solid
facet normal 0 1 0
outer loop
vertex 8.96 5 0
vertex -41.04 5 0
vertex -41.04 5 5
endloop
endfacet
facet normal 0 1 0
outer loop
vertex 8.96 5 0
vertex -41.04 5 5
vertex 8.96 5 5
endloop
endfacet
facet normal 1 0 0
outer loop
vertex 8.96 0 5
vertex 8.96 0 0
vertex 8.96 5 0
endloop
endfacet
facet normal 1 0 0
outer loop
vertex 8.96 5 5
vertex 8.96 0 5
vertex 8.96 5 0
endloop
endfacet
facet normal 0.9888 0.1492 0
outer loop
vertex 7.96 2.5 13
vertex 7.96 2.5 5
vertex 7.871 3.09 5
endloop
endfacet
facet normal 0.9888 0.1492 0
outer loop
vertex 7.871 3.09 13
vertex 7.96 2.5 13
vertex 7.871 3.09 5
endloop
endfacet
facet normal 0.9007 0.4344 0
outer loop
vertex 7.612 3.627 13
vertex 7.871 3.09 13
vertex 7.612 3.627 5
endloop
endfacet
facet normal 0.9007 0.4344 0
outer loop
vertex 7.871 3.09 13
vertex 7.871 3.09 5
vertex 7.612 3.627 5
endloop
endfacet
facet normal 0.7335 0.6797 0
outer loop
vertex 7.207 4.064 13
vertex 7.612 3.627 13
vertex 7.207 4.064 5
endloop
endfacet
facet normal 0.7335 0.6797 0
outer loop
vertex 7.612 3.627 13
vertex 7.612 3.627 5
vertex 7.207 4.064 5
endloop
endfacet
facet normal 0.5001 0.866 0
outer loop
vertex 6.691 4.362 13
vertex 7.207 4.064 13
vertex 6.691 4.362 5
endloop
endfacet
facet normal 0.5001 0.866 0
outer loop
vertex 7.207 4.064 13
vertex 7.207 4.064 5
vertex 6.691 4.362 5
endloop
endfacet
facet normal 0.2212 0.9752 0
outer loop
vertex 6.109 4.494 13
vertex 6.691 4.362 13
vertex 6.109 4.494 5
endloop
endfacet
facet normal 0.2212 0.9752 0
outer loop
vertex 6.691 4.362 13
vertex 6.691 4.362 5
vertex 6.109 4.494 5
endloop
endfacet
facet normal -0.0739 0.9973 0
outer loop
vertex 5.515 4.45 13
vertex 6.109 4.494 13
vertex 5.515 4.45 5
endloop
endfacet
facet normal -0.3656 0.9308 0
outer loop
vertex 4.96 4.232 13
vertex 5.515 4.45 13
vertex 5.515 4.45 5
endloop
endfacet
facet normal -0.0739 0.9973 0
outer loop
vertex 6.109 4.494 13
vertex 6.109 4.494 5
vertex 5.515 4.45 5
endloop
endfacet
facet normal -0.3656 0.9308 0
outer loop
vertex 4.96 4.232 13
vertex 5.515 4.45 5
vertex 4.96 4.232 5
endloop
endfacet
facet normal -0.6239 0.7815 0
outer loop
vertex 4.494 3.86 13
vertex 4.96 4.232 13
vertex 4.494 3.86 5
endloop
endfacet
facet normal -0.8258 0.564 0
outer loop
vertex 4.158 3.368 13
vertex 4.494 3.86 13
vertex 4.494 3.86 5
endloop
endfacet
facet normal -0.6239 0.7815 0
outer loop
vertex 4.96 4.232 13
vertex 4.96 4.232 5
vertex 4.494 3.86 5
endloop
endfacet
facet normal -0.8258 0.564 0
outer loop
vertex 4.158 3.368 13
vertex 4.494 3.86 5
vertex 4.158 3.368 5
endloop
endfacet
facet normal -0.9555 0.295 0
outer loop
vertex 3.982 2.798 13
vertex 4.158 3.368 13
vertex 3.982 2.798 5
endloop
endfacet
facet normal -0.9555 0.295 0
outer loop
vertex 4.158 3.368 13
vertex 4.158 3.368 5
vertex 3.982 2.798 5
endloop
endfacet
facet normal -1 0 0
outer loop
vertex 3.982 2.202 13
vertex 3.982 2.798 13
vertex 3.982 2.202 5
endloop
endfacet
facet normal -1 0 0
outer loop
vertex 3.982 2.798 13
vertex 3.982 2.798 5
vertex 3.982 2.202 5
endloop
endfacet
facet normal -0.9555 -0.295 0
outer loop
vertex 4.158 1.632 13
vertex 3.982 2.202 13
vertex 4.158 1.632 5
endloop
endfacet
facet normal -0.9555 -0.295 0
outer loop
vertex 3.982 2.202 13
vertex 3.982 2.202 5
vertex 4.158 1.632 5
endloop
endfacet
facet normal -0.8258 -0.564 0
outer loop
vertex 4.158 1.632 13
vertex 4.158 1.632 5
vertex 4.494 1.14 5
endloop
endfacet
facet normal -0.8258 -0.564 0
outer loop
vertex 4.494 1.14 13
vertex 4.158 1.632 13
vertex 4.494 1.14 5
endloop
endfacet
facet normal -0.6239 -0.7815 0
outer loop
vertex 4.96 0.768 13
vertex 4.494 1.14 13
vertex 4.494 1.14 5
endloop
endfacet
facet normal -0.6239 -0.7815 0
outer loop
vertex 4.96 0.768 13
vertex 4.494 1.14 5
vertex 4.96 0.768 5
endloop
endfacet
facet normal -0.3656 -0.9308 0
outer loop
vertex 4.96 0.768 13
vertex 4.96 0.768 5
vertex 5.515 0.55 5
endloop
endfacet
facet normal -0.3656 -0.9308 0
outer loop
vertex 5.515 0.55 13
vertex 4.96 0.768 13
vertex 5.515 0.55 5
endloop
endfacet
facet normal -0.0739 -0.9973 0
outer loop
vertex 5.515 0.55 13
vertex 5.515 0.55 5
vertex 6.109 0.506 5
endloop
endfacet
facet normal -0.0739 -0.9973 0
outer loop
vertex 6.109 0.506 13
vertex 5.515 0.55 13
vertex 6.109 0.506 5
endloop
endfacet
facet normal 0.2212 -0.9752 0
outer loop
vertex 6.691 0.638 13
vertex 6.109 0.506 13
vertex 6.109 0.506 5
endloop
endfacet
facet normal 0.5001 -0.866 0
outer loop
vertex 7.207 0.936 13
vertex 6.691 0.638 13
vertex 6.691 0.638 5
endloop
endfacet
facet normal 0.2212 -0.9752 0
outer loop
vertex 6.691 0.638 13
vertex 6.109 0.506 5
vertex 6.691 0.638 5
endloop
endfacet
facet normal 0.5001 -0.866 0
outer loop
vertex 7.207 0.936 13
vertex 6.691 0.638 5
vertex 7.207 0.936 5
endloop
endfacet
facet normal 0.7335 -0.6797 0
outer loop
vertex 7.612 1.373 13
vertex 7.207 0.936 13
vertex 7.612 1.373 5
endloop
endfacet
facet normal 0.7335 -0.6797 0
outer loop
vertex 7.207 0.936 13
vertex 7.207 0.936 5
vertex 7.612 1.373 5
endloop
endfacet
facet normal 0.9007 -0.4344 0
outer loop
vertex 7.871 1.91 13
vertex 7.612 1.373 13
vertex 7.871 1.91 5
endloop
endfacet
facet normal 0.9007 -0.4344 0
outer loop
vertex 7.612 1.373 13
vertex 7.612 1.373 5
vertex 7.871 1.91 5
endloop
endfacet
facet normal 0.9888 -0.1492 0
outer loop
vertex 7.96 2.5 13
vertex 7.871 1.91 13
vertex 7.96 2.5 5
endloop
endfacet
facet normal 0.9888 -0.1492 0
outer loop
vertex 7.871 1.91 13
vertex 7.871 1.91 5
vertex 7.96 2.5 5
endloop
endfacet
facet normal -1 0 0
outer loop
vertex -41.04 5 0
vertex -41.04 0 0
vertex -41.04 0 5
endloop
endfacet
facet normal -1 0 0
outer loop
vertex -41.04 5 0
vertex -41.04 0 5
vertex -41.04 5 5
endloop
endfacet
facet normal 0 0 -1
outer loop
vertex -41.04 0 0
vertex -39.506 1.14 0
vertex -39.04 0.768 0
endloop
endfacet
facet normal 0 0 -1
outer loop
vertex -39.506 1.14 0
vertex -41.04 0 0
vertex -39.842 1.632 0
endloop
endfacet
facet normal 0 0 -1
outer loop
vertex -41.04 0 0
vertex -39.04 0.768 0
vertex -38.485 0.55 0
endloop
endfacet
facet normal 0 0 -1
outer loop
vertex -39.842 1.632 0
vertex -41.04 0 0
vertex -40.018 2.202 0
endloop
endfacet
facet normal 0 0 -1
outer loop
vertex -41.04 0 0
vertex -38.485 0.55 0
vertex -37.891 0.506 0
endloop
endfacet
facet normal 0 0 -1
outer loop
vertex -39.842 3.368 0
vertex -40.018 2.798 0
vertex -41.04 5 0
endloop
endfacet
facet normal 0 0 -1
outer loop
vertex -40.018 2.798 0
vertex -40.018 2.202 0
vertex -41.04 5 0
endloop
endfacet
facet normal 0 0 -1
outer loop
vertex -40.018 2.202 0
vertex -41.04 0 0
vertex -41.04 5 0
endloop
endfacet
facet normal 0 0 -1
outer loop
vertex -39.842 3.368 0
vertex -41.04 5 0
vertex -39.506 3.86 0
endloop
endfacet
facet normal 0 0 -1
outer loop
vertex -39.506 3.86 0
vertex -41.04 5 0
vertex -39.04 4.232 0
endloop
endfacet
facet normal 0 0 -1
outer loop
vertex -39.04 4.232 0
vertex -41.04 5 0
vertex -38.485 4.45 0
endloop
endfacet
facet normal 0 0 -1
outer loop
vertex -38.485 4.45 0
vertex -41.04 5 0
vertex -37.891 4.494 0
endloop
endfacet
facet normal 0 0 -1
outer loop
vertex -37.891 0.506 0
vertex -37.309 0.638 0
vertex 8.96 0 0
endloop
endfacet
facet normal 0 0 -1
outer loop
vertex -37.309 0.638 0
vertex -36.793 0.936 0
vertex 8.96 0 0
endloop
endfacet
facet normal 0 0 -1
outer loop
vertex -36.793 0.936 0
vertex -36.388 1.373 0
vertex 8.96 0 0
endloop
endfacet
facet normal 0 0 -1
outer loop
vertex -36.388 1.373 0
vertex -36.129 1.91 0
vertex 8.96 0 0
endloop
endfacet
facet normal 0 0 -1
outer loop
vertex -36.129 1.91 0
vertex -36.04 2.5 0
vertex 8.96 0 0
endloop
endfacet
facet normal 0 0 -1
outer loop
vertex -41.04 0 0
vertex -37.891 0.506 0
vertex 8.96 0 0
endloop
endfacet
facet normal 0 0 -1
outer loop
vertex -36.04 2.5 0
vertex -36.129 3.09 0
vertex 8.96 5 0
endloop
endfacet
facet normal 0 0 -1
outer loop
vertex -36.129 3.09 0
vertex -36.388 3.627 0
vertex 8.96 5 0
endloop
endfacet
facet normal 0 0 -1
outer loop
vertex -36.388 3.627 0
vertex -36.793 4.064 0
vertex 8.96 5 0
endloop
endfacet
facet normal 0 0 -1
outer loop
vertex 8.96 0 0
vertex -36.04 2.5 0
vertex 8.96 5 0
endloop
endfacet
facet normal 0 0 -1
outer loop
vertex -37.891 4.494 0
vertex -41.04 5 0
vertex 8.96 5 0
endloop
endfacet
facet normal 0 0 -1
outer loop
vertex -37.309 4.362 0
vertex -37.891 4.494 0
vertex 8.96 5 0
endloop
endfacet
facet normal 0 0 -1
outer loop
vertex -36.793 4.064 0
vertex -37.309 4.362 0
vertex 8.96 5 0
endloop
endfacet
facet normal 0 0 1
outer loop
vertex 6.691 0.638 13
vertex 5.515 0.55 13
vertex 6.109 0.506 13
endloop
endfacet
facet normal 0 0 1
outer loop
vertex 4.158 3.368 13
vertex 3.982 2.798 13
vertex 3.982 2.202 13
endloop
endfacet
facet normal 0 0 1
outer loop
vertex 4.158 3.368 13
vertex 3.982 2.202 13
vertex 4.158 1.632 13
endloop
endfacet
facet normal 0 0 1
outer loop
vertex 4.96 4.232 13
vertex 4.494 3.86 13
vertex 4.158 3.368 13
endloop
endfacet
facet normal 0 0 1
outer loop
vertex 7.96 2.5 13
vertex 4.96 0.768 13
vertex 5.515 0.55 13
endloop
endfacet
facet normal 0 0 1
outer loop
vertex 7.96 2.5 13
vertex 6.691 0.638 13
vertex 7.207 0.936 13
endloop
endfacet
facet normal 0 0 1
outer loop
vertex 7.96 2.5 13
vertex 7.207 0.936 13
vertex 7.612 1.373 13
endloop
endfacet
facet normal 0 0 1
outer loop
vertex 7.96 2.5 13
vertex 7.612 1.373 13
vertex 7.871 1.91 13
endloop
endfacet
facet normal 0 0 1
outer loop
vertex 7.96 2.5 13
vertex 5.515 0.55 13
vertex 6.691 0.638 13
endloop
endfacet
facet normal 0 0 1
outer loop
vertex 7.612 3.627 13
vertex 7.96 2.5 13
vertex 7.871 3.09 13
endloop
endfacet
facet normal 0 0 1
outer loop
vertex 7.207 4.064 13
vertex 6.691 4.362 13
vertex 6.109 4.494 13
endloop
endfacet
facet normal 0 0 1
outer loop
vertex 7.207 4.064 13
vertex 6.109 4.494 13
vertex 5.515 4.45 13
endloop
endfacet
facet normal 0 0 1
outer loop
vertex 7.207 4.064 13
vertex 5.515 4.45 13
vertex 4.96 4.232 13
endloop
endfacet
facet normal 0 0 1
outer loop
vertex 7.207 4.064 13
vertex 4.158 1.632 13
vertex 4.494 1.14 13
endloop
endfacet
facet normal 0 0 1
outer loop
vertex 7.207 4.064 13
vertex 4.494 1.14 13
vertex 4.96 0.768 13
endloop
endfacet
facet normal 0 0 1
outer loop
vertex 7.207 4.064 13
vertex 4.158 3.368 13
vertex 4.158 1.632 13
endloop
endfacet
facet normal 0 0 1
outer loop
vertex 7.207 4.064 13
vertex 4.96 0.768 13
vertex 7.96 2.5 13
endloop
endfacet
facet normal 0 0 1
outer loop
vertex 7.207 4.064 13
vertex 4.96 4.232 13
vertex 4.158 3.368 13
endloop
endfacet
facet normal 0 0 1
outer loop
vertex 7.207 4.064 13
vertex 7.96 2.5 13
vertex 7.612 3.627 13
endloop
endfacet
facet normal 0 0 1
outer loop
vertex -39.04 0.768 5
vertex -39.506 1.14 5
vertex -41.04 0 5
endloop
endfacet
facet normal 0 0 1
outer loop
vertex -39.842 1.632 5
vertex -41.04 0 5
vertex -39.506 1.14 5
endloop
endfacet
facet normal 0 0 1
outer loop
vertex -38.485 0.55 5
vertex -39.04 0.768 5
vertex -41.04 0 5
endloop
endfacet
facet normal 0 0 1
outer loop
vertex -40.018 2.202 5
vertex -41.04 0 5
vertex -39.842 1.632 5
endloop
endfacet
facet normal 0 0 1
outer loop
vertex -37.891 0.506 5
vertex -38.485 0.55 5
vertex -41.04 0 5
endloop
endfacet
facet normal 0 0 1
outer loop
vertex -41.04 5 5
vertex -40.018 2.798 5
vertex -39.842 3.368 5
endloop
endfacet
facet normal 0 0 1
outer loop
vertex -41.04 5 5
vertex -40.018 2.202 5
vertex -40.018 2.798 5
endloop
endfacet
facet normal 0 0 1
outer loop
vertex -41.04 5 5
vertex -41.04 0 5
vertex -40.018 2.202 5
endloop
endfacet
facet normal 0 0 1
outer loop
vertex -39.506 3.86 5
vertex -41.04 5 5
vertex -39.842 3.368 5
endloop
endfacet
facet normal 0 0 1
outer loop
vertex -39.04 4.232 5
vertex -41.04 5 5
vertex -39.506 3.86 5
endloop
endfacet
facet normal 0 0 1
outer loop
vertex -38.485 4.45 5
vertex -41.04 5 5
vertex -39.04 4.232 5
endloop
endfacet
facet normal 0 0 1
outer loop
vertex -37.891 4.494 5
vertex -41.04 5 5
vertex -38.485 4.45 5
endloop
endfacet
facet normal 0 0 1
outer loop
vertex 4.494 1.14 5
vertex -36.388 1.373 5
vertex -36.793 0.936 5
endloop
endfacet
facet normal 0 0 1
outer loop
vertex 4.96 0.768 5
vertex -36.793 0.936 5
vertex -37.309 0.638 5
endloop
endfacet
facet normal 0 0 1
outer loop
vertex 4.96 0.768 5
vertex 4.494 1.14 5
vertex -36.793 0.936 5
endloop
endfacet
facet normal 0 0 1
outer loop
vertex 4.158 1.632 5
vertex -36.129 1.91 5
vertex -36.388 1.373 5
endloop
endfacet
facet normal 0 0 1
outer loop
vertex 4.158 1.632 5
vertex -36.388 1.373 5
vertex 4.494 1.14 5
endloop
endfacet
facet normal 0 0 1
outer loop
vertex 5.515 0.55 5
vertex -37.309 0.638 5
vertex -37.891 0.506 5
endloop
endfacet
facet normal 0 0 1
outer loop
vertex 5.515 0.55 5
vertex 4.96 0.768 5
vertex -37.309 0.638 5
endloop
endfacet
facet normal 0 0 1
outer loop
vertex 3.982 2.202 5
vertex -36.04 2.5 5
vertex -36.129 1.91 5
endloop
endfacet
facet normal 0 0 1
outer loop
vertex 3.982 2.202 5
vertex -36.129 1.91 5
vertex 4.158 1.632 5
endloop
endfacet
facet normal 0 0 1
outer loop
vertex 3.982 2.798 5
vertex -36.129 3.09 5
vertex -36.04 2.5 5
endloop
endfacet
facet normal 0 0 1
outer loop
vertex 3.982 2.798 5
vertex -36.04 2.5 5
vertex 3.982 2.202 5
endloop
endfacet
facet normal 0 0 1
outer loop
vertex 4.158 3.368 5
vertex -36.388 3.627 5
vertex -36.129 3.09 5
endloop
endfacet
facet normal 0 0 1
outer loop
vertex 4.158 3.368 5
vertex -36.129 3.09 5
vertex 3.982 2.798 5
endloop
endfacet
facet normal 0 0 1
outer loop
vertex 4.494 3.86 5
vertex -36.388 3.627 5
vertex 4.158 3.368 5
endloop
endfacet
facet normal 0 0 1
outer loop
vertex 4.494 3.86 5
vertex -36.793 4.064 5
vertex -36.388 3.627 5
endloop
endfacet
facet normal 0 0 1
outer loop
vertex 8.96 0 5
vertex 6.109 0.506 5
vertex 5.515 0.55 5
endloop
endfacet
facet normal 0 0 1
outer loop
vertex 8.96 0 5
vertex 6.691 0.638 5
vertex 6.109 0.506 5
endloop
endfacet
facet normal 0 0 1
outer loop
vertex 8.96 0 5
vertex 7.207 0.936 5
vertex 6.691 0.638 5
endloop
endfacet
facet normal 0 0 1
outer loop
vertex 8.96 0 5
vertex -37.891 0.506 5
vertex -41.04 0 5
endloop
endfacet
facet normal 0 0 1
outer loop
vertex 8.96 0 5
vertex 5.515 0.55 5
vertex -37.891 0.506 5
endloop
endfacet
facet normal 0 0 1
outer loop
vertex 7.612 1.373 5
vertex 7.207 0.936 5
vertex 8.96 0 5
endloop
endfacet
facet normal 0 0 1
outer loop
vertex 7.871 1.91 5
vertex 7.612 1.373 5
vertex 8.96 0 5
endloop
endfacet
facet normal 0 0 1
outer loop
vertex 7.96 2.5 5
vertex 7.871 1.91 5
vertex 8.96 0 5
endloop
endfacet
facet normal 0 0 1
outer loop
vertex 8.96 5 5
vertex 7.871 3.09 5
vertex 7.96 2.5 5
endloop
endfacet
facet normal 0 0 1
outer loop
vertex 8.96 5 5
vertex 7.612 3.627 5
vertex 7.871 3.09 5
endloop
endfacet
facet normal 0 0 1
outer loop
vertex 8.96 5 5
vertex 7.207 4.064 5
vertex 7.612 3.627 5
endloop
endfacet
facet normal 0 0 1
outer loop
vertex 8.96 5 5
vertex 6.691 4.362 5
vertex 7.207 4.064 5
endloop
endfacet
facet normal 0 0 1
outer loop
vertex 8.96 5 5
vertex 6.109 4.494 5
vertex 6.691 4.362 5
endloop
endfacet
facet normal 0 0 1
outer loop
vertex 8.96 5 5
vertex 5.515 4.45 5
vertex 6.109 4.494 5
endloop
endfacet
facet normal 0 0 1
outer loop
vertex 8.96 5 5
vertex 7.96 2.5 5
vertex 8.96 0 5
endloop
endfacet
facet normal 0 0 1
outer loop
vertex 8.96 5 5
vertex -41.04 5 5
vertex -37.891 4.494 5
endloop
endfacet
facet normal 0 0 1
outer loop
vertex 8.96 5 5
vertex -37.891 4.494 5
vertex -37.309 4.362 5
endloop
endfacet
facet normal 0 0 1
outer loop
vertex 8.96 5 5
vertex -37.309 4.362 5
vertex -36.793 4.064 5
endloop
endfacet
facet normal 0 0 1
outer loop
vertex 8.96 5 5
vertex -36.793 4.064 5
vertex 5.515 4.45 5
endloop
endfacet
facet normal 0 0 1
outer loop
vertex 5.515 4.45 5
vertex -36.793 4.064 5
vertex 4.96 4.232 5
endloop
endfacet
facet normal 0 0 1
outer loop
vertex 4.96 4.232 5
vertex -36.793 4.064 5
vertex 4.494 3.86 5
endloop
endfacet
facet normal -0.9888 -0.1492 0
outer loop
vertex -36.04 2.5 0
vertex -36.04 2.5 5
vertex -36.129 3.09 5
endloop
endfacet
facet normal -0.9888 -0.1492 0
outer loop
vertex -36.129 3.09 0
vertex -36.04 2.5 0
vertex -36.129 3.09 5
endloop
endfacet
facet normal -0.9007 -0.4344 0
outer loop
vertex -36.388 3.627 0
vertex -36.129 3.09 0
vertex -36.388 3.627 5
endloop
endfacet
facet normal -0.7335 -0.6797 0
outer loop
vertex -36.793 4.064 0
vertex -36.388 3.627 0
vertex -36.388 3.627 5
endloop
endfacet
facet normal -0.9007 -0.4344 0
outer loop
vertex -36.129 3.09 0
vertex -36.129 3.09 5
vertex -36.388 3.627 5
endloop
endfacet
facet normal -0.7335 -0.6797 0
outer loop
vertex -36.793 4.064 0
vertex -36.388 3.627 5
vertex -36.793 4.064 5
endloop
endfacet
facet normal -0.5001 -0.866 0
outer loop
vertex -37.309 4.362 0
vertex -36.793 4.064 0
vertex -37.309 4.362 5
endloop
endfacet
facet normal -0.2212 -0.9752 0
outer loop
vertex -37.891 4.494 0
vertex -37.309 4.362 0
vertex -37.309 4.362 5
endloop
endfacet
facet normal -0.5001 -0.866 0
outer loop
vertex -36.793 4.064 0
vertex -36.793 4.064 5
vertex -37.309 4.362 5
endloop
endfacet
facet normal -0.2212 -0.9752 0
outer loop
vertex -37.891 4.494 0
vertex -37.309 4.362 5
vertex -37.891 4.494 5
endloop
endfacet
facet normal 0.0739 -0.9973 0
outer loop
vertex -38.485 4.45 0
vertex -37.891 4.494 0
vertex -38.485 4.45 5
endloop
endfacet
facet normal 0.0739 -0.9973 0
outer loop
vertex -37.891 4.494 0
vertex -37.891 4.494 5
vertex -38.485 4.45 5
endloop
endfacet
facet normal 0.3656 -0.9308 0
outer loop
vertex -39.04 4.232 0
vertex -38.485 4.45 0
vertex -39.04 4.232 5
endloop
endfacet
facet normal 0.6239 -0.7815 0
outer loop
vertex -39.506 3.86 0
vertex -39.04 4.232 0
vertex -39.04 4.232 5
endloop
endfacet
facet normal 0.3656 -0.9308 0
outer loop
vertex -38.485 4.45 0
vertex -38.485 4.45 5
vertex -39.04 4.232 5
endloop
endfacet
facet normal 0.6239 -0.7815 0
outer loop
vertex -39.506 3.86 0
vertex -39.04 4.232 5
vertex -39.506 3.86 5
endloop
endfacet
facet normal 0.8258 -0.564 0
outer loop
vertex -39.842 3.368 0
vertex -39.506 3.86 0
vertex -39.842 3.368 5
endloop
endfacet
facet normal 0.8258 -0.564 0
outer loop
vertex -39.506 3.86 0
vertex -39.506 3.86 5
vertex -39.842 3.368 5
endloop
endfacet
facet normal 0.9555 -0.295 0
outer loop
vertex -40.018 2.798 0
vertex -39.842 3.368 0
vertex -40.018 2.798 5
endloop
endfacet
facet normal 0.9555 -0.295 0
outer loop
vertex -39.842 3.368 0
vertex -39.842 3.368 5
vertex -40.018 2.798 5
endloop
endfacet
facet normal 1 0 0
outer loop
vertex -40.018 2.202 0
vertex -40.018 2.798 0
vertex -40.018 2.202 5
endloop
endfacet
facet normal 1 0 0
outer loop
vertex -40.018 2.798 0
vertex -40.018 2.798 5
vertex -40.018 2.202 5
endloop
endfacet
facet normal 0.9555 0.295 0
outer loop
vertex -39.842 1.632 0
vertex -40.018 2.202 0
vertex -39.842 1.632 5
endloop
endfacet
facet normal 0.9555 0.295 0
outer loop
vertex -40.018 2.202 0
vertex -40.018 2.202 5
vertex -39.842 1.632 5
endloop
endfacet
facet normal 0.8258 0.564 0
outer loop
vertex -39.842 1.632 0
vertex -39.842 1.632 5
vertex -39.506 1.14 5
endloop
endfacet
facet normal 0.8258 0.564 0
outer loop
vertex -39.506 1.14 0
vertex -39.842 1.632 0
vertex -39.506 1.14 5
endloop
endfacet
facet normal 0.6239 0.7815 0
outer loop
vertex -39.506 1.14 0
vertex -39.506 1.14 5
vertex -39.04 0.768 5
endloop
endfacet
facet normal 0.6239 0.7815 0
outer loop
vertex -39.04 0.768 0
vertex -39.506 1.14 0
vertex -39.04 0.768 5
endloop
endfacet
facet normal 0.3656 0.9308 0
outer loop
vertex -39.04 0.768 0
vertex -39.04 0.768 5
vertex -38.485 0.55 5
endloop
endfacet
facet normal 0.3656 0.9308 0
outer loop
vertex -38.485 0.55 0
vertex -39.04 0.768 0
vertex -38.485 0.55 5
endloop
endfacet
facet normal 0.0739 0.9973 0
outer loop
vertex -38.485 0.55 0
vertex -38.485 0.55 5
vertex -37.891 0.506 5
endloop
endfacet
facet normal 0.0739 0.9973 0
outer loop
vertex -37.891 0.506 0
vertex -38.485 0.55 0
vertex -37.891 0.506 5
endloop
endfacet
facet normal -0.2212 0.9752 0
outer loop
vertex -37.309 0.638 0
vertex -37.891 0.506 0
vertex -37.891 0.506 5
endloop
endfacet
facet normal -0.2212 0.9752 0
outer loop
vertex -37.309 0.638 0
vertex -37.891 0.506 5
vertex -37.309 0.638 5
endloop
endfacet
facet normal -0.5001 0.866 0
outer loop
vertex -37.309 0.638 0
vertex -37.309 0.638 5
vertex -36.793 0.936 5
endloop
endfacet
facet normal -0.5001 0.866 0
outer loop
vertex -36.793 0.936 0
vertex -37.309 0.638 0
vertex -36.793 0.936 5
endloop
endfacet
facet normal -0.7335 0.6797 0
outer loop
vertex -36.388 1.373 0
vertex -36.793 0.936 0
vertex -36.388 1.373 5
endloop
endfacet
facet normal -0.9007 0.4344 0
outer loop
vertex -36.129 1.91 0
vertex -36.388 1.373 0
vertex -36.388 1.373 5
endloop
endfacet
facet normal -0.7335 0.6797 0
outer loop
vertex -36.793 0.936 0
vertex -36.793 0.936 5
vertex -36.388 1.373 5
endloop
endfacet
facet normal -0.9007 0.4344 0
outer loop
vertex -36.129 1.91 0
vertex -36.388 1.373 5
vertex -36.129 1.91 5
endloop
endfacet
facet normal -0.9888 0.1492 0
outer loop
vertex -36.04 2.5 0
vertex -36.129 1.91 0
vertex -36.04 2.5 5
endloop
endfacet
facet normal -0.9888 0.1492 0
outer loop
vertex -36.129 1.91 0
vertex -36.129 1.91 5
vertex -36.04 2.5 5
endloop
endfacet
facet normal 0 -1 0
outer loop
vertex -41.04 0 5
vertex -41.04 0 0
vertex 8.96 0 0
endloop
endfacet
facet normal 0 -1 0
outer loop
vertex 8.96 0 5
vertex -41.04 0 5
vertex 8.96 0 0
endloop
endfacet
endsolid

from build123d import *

# Parameters (mm, degrees)
SKETCH_2_W          = 50
SKETCH_2_H          = 5
EXTRUDE_1_DEPTH     = 5
SKETCH_3_R          = 2
CUT_EXTRUDE_1_DEPTH = 5
SKETCH_4_R          = 2
EXTRUDE_2_DEPTH     = 8


with BuildPart() as part:
    # 草图2 → 凸台-拉伸1 (new body)
    with BuildSketch(Plane.XY):
        with Locations((-16.04, 2.5)):
            Rectangle(SKETCH_2_W, SKETCH_2_H)
    extrude(amount=EXTRUDE_1_DEPTH)

    # 草图3 → 切除-拉伸1 (cut)
    with BuildSketch(Plane.XY.offset(5)):
        with Locations((-38.04, 2.5)):
            Circle(SKETCH_3_R)
    extrude(amount=-CUT_EXTRUDE_1_DEPTH, mode=Mode.SUBTRACT)

    # 草图4 → 凸台-拉伸2 (add)
    with BuildSketch(Plane.XY.offset(5)):
        with Locations((5.96, 2.5)):
            Circle(SKETCH_4_R)
    extrude(amount=EXTRUDE_2_DEPTH)


solid = part.part
